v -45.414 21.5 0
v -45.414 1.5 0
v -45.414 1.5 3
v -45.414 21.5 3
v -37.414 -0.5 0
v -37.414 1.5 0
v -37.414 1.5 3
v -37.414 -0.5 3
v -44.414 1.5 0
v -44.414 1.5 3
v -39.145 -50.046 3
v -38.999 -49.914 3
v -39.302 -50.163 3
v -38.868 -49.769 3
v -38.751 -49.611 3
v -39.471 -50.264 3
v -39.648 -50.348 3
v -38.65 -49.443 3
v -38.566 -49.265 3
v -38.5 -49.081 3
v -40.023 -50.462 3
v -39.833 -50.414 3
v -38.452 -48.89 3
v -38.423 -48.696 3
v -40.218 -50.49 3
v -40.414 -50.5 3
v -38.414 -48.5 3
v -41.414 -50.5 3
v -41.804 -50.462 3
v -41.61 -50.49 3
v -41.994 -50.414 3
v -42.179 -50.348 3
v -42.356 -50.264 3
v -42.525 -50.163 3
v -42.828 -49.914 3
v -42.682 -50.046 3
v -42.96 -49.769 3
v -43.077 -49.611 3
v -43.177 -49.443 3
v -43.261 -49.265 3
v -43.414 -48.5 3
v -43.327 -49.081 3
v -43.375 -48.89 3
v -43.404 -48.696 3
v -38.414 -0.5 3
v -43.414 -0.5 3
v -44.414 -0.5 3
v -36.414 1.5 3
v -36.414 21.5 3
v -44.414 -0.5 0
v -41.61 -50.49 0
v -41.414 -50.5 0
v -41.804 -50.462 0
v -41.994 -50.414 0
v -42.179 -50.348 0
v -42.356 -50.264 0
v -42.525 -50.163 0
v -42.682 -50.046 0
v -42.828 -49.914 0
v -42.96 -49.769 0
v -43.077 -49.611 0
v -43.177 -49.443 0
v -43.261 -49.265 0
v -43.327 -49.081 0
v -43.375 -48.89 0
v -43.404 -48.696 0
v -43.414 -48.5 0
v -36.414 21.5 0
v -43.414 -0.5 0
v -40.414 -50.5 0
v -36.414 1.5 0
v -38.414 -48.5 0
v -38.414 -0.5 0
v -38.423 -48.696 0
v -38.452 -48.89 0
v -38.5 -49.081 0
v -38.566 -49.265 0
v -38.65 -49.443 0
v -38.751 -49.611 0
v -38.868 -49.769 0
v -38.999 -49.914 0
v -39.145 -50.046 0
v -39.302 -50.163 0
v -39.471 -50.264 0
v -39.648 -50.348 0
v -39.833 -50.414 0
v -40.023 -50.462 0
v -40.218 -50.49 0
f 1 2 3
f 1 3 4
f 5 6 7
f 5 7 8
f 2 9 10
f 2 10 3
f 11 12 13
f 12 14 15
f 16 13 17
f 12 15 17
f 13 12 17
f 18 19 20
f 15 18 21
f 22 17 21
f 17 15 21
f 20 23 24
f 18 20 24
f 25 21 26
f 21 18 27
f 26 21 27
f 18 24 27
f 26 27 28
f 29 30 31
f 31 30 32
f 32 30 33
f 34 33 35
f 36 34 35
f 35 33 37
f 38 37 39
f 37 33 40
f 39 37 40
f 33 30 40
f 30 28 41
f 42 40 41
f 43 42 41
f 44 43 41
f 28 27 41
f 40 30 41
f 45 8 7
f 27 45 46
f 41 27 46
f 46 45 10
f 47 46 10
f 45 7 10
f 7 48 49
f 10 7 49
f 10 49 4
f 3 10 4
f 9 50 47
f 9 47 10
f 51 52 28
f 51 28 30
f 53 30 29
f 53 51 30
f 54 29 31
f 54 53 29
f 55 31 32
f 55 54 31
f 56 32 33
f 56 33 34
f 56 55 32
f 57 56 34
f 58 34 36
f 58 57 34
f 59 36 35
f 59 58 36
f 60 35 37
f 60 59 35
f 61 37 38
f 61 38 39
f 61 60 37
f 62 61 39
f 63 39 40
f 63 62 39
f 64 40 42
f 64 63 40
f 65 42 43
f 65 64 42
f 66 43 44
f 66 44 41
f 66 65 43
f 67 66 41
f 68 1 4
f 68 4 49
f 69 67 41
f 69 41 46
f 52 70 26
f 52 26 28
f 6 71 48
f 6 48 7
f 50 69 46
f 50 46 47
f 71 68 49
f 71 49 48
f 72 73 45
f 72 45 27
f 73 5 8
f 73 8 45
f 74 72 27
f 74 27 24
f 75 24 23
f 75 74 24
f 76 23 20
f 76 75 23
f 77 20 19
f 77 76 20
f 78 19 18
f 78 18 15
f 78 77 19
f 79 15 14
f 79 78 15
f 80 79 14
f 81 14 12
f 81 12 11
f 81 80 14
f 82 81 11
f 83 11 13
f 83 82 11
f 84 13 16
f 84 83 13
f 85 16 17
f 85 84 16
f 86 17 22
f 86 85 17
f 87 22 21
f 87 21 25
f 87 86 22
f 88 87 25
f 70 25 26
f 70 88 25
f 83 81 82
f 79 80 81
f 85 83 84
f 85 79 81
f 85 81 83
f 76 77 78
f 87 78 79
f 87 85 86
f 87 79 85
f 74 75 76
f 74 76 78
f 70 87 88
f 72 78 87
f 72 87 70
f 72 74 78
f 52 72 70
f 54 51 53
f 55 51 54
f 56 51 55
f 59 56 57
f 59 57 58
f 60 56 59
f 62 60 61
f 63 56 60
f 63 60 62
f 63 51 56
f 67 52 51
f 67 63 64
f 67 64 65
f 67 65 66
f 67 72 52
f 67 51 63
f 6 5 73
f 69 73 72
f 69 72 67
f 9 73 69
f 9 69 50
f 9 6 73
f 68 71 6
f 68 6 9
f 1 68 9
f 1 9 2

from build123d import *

# Parameters (mm, degrees)
SALIENTE_EXTRUIR1_DEPTH = 3


with BuildPart() as part:
    # Model → Saliente-Extruir1 (new body)
    with BuildSketch(Plane.XY):
        with BuildLine():
            Line((-36.413611368, 21.5), (-36.413611368, 15.5))
            Line((-36.413611368, 15.5), (-36.413611368, 1.5))
            Line((-36.413611368, 1.5), (-37.413611368, 1.5))
            Line((-37.413611368, 1.5), (-37.413611368, -0.5))
            Line((-37.413611368, -0.5), (-38.413611368, -0.5))
            Line((-38.413611368, -0.5), (-38.413611368, -48.5))
            ThreePointArc((-38.413611368, -48.5), (-38.999397805, -49.914213562), (-40.413611368, -50.5))
            Line((-40.413611368, -50.5), (-41.413611368, -50.5))
            ThreePointArc((-41.413611368, -50.5), (-42.82782493, -49.914213562), (-43.413611368, -48.5))
            Line((-43.413611368, -48.5), (-43.413611368, -0.5))
            Line((-43.413611368, -0.5), (-44.413611368, -0.5))
            Line((-44.413611368, -0.5), (-44.413611368, 1.5))
            Line((-44.413611368, 1.5), (-45.413611368, 1.5))
            Line((-45.413611368, 1.5), (-45.413611368, 21.5))
            Line((-45.413611368, 21.5), (-36.413611368, 21.5))
        make_face()
    extrude(amount=SALIENTE_EXTRUIR1_DEPTH)


solid = part.part
